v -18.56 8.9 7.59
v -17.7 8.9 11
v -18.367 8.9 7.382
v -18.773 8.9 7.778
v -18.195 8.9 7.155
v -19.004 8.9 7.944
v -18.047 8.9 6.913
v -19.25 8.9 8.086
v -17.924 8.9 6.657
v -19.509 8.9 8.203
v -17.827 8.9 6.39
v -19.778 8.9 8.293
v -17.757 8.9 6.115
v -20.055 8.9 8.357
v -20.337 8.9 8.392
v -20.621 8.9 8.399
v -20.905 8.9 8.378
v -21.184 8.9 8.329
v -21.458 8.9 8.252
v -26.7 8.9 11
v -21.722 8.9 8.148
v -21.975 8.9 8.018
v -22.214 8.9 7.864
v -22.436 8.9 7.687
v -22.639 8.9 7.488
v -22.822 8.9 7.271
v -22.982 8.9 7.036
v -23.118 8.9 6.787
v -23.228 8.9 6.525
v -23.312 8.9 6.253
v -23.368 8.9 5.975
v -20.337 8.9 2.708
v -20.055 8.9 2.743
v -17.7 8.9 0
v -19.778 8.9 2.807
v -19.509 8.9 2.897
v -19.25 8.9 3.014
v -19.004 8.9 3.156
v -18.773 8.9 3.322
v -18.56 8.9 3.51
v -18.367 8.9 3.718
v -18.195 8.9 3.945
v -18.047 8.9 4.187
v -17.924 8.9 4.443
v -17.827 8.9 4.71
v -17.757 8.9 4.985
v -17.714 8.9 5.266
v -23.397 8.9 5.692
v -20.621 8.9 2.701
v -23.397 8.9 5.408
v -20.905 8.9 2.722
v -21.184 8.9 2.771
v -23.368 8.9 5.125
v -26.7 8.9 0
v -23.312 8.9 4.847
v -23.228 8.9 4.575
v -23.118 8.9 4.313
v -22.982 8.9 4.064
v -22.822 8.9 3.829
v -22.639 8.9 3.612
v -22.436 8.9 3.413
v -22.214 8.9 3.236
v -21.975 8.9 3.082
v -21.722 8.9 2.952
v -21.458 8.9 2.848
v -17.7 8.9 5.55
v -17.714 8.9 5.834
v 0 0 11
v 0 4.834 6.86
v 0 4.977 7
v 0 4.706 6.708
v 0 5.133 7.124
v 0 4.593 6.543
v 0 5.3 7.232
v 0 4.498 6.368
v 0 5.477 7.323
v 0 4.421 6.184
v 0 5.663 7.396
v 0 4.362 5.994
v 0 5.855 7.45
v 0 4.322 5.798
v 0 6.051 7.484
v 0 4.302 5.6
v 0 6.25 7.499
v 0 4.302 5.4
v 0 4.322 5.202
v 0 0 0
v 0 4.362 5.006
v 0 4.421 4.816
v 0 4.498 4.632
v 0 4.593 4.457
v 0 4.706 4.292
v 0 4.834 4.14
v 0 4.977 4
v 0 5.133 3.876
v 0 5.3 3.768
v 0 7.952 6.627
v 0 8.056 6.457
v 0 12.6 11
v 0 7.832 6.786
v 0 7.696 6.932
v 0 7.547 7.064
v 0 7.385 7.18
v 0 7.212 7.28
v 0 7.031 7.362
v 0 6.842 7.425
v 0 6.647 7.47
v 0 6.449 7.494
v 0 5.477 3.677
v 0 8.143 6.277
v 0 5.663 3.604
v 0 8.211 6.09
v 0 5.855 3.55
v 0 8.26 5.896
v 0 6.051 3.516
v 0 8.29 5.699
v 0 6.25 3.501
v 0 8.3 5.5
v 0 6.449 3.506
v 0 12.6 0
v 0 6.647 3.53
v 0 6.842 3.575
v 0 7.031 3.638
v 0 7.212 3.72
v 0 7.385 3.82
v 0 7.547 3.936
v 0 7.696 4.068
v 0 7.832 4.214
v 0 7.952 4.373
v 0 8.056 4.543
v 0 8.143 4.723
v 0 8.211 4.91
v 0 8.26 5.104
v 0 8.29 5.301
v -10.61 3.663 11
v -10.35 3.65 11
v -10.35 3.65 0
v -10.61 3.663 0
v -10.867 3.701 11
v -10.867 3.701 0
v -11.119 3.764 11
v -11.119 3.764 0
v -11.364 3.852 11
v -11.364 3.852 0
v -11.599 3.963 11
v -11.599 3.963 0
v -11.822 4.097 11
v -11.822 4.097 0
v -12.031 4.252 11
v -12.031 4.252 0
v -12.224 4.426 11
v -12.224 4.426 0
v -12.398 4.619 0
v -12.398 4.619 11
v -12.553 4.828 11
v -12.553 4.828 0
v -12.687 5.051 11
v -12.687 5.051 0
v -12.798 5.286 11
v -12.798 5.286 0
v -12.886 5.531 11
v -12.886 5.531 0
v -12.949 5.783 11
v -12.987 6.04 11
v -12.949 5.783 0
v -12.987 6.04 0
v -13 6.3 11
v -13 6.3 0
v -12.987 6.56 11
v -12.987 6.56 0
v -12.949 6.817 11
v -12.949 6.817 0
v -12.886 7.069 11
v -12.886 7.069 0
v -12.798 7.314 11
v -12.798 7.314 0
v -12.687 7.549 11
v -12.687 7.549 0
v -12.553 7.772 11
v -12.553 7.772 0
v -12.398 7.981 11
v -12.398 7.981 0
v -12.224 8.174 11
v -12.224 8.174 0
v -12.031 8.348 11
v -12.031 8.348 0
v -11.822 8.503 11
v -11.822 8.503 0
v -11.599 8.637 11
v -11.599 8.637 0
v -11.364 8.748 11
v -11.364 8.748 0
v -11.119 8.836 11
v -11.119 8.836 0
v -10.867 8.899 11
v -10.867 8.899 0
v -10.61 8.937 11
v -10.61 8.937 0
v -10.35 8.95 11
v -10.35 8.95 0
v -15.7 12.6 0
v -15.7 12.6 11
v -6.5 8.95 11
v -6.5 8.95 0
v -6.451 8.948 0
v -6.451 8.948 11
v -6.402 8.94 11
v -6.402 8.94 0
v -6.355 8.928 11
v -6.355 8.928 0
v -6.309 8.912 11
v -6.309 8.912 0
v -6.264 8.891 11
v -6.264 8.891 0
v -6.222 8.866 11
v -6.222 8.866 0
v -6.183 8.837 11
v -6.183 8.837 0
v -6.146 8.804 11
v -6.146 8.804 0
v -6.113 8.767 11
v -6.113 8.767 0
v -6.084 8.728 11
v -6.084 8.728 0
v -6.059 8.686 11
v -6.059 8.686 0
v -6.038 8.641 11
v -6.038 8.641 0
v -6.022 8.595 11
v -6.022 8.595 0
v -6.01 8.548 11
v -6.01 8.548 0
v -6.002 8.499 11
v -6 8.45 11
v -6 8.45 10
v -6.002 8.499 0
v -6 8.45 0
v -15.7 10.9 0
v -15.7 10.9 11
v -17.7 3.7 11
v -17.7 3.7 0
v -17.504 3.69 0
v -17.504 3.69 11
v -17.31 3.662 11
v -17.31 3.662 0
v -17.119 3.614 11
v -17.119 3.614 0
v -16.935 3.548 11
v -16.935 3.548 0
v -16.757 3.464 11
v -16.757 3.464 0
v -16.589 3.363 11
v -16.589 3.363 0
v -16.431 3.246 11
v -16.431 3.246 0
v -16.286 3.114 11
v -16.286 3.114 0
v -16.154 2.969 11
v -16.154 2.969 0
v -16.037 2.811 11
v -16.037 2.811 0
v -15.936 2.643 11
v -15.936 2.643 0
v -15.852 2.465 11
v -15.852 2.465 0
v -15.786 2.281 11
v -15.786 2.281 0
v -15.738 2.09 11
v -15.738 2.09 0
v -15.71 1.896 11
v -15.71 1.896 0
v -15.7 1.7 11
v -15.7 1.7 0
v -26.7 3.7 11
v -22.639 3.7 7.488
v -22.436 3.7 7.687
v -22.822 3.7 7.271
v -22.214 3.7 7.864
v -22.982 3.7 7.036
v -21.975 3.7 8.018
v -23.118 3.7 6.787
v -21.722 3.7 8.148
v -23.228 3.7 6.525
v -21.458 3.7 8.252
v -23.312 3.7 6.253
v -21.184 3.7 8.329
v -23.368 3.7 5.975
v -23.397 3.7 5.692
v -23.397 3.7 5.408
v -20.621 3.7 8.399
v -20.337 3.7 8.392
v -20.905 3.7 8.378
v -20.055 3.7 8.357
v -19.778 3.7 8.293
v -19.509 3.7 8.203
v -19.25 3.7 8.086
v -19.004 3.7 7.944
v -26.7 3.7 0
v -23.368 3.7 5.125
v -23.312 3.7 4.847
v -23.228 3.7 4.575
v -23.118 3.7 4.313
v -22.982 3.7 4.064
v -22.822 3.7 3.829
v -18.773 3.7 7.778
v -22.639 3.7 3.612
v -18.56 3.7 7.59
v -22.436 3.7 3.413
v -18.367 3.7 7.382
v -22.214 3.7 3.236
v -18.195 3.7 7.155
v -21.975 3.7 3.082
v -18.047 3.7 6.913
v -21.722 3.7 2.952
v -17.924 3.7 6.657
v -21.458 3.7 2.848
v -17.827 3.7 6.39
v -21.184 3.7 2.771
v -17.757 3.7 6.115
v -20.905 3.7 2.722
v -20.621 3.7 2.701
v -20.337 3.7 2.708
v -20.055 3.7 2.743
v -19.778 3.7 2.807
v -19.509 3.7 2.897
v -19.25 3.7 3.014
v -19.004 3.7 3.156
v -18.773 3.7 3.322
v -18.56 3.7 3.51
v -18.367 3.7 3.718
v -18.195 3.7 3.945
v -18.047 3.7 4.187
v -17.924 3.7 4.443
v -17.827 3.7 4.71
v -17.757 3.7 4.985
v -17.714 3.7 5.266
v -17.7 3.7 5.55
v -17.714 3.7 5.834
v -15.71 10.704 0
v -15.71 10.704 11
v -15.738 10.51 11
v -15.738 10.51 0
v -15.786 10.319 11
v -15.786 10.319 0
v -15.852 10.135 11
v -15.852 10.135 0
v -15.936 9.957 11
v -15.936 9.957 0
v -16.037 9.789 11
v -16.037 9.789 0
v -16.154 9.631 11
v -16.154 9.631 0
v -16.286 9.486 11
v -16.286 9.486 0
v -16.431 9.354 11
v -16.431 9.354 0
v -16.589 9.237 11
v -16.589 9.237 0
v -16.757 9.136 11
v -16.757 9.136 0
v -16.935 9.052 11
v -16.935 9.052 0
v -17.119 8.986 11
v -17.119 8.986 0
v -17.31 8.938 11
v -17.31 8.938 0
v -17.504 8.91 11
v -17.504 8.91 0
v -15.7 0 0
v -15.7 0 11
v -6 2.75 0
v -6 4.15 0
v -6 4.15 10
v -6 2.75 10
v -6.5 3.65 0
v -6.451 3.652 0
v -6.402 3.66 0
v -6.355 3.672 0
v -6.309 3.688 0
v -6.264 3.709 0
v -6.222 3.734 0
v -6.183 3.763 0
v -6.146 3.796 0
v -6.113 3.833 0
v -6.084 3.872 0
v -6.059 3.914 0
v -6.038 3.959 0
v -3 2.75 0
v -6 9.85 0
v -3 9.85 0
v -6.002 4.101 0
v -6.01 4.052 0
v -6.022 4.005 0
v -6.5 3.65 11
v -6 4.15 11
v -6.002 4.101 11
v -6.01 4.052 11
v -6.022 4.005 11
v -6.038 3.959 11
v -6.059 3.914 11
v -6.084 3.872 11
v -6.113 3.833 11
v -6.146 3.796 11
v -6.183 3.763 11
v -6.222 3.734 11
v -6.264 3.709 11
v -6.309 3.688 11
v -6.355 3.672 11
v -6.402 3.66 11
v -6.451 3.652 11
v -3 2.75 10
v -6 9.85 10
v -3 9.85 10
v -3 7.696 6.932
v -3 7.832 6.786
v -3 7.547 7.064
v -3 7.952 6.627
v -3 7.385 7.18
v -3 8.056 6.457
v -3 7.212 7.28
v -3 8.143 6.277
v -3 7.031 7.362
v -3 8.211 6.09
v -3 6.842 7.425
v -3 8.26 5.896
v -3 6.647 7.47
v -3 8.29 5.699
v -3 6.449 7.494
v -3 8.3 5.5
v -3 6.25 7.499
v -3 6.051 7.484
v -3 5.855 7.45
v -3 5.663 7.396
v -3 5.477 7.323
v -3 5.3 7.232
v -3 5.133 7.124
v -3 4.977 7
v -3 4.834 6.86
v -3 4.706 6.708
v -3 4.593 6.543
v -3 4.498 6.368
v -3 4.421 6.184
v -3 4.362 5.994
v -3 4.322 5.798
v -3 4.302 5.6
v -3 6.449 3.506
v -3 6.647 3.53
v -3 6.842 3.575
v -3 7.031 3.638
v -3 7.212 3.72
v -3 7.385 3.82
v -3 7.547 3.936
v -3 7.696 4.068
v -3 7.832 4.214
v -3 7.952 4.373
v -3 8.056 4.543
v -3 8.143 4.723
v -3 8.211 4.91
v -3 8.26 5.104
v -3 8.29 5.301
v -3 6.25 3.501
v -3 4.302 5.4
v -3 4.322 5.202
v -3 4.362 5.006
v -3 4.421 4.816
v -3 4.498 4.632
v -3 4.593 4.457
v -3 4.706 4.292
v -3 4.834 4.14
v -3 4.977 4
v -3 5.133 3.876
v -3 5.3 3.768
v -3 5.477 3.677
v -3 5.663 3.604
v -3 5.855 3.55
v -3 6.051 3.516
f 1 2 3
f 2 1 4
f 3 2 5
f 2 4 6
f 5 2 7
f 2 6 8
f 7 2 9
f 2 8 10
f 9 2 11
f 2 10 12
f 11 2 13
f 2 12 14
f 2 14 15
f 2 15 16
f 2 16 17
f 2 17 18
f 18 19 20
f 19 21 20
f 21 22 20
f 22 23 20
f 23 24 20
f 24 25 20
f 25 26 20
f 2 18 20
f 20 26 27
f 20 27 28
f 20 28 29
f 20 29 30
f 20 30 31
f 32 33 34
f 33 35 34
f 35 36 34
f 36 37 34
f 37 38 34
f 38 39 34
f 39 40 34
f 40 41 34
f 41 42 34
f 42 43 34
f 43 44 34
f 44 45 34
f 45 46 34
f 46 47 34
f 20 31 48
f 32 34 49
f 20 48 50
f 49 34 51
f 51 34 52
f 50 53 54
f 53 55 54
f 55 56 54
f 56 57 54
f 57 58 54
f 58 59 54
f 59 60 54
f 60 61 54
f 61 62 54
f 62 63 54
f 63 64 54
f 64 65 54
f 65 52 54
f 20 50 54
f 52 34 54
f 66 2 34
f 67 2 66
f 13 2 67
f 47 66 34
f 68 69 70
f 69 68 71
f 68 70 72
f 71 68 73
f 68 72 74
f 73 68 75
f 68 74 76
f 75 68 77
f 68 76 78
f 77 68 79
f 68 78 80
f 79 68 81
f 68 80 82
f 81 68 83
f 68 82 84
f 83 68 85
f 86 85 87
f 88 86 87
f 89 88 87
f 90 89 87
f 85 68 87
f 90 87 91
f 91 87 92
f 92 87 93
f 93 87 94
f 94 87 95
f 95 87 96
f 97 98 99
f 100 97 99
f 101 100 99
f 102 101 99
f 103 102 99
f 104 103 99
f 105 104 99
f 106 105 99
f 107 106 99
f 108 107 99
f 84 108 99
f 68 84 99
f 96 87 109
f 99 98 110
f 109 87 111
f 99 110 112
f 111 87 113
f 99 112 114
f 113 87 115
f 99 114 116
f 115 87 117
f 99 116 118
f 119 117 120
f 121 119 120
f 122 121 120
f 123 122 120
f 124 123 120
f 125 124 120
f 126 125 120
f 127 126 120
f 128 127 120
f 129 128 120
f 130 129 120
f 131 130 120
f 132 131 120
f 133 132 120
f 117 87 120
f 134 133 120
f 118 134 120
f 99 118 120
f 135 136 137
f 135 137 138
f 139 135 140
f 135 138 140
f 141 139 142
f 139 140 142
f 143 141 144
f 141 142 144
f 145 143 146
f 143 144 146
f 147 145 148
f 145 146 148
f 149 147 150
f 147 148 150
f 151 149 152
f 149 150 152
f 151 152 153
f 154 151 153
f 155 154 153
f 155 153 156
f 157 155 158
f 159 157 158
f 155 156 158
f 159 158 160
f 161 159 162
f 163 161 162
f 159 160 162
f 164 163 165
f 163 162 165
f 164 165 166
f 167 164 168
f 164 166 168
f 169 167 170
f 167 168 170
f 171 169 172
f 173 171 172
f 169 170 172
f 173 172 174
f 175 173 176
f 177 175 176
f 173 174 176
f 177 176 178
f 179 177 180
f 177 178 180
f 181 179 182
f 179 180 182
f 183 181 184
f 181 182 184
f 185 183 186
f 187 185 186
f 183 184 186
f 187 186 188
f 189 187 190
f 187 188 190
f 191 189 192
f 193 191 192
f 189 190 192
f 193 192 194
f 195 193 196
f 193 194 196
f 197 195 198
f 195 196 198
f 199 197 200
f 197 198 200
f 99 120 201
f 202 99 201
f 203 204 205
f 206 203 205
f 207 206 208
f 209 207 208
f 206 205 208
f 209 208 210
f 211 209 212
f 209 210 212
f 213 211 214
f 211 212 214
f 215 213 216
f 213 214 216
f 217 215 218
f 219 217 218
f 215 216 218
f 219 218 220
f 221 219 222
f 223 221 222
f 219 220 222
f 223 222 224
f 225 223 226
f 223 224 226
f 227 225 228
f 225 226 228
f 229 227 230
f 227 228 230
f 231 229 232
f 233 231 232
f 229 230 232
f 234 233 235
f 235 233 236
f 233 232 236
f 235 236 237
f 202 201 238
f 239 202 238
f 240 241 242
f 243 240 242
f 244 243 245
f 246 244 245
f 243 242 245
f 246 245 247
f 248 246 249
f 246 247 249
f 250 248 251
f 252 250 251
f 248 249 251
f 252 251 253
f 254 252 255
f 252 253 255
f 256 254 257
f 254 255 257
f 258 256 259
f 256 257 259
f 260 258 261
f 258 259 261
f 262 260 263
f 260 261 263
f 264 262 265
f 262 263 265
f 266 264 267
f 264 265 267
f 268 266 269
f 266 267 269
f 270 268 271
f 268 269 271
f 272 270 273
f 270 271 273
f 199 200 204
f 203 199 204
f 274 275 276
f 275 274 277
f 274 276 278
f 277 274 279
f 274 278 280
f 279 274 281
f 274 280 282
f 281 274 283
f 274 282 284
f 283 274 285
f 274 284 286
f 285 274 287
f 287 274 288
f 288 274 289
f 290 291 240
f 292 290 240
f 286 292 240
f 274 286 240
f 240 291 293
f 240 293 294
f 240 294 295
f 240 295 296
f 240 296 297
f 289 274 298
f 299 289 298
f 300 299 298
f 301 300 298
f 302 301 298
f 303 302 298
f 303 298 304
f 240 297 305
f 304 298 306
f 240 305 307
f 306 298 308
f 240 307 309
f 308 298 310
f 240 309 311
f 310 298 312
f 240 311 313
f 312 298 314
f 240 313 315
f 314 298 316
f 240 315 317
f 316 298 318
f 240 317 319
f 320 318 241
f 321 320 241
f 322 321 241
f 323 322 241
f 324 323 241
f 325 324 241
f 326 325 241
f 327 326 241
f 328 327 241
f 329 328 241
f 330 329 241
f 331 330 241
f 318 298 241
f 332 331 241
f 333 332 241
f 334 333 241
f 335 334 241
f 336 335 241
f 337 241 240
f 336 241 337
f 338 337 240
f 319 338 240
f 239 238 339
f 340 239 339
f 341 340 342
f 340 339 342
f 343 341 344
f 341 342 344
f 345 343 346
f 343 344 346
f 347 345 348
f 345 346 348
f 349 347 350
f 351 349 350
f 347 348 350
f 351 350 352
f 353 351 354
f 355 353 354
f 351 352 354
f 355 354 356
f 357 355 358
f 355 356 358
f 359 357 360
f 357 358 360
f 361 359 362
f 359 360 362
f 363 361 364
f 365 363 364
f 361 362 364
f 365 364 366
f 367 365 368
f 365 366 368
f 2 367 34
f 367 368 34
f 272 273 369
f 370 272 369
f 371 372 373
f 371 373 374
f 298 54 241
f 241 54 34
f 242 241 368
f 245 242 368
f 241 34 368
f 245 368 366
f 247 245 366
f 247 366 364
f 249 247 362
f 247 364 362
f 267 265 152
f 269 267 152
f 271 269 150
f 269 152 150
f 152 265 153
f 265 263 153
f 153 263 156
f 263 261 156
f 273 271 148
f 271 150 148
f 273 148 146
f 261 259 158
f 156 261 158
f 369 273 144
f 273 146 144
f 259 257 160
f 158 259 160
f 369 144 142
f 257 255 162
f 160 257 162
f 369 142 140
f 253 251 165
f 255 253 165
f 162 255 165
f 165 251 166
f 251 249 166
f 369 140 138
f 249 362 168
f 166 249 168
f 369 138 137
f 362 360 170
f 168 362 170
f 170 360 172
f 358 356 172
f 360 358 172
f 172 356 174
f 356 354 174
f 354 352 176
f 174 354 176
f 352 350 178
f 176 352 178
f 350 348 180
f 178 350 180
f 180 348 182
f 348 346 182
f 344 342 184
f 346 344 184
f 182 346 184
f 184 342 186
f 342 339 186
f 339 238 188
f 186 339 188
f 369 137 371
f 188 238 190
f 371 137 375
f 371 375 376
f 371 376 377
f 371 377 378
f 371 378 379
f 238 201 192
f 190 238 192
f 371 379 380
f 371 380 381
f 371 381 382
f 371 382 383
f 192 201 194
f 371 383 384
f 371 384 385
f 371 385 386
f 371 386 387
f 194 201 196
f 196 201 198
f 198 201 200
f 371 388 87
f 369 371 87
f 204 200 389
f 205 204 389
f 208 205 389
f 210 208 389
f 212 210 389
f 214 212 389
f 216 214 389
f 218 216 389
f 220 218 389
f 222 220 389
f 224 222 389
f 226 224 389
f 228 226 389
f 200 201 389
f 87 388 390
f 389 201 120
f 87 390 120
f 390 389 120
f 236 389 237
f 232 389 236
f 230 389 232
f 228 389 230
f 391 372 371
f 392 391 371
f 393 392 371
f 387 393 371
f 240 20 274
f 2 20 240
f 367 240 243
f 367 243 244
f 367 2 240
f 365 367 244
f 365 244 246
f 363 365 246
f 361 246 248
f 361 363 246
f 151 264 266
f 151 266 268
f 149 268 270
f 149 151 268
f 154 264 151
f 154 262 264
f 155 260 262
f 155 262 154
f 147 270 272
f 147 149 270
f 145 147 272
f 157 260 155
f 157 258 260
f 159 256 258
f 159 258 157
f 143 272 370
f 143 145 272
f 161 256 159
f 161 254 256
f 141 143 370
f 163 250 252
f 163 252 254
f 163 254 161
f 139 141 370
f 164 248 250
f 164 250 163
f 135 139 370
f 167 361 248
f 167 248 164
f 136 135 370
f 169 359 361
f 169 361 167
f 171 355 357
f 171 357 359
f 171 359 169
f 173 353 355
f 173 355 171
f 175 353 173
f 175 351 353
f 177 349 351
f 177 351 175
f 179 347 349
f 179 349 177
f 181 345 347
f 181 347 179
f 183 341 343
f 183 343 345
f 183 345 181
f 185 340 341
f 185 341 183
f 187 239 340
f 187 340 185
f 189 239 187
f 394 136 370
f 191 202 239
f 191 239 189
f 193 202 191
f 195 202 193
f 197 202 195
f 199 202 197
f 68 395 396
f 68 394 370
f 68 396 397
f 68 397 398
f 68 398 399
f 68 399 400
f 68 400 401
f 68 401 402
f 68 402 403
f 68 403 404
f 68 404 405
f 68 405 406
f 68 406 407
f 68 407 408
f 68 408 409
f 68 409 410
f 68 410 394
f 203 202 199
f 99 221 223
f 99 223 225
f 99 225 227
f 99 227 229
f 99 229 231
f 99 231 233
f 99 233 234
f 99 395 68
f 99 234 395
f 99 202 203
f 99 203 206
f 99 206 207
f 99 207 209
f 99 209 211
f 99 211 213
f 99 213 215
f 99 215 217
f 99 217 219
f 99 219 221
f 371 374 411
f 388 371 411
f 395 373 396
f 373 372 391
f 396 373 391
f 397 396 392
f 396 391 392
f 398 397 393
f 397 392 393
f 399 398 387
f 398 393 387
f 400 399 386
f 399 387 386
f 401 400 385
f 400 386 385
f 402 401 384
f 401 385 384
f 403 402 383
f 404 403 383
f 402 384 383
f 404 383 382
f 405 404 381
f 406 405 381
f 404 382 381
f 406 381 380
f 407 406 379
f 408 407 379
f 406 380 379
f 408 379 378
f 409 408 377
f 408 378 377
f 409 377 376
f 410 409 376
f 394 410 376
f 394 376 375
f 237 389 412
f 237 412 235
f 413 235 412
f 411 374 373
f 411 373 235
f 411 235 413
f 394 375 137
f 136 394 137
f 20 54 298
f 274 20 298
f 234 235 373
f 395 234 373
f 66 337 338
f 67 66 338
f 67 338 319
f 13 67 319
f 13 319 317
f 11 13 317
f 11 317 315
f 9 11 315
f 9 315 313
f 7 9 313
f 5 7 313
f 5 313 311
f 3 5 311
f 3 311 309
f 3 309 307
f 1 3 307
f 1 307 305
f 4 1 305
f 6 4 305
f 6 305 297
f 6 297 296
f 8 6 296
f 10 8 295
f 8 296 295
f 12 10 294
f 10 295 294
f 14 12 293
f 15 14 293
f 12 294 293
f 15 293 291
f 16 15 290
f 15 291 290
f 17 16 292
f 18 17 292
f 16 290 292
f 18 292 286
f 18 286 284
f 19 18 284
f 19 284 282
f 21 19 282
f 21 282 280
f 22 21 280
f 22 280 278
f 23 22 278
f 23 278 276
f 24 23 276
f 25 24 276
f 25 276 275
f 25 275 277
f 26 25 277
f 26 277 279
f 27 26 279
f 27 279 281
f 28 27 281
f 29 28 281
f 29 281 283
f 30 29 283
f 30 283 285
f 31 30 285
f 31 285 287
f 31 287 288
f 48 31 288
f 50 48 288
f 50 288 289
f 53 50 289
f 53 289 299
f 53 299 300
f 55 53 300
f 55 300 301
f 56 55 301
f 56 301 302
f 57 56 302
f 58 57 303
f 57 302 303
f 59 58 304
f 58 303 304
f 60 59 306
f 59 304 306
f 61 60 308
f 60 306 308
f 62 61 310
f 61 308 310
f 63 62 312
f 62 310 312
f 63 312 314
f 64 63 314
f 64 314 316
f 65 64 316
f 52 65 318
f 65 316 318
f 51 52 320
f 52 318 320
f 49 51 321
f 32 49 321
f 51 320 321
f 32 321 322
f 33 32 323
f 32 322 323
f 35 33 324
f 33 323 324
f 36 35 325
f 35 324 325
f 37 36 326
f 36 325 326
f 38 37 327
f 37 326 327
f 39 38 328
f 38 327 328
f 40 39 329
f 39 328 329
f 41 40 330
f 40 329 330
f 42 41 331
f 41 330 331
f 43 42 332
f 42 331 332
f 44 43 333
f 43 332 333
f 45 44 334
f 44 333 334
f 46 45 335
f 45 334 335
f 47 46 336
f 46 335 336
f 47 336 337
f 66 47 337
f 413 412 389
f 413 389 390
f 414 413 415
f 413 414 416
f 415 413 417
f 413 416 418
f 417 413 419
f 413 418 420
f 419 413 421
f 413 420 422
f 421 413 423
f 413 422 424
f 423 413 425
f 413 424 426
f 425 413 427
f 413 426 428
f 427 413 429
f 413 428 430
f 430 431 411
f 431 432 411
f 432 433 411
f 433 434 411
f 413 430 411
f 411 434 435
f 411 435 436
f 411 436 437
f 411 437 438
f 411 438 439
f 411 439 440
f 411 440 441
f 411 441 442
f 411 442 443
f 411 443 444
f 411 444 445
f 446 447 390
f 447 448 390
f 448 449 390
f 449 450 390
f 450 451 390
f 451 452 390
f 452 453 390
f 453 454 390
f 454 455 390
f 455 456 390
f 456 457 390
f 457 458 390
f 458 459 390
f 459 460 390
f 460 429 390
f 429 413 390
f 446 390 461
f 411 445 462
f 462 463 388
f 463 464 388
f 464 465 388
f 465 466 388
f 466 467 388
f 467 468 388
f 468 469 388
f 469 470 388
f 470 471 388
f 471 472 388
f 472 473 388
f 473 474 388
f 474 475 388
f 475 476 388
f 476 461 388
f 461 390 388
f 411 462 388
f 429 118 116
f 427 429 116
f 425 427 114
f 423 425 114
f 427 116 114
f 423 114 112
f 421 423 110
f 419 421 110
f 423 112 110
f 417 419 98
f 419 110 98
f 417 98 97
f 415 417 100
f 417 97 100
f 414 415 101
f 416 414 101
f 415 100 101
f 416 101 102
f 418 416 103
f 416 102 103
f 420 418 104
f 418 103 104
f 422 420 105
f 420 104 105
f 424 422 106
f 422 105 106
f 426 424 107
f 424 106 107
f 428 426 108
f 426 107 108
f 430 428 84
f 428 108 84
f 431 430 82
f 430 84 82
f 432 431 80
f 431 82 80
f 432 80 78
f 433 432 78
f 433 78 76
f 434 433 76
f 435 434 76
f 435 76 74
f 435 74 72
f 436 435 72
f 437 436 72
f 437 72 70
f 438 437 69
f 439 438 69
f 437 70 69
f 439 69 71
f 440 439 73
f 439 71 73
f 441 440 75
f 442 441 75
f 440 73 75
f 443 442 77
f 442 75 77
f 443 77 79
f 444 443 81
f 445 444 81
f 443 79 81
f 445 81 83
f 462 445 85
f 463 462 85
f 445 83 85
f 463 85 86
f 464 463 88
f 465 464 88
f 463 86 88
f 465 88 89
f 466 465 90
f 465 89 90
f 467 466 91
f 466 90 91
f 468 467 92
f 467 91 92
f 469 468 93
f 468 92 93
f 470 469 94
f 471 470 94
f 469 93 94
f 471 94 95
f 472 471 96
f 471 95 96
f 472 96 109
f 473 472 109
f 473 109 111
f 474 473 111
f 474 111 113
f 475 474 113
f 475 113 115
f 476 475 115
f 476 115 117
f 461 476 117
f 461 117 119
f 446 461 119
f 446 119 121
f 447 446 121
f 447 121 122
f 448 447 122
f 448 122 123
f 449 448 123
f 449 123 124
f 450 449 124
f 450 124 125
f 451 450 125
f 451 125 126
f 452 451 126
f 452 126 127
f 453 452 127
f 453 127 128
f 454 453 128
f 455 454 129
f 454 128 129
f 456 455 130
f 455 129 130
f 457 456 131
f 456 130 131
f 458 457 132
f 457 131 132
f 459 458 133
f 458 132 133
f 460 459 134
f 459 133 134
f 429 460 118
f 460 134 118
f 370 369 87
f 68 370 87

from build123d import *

# Parameters (mm, degrees)
F1_DEPTH = 11
F2_R     = 2.85
F3_DEPTH = 25
F4_W     = 3
F4_H     = 7.1
F5_DEPTH = 10
F6_R     = 2
F7_DEPTH = 3


with BuildPart() as f1:
    # F0 (on Top) → F1 (new body)
    with BuildSketch(Plane.XY):
        with BuildLine():
            Line((-15.7, 1.7), (-15.7, 0))
            Line((-15.7, 0), (0, 0))
            Line((0, 0), (0, 12.6))
            Line((0, 12.6), (-15.7, 12.6))
            Line((-15.7, 12.6), (-15.7, 10.9))
            ThreePointArc((-15.7, 10.9), (-16.285786, 9.485786), (-17.7, 8.9))
            Line((-17.7, 8.9), (-26.7, 8.9))
            Line((-26.7, 8.9), (-26.7, 3.7))
            Line((-26.7, 3.7), (-17.7, 3.7))
            ThreePointArc((-17.7, 3.7), (-16.285786, 3.114214), (-15.7, 1.7))
        make_face()
        with BuildLine():
            ThreePointArc((-6, 4.15), (-6.146447, 3.796447), (-6.5, 3.65))
            Line((-6.5, 3.65), (-10.35, 3.65))
            ThreePointArc((-10.35, 3.65), (-13, 6.3), (-10.35, 8.95))
            Line((-10.35, 8.95), (-6.5, 8.95))
            ThreePointArc((-6.5, 8.95), (-6.146447, 8.803553), (-6, 8.45))
            Line((-6, 8.45), (-6, 4.15))
        make_face(mode=Mode.SUBTRACT)
    extrude(amount=F1_DEPTH)

    # F2 (on face) → F3 (cut)
    with BuildSketch(Plane.XZ.offset(-3.7)):
        with Locations((-20.550203, 5.55)):
            Circle(F2_R)
    extrude(amount=-F3_DEPTH, mode=Mode.SUBTRACT)

    # F4 (on face) → F5 (cut)
    with BuildSketch(Plane(origin=(0, 0, 0), x_dir=(1, 0, 0), z_dir=(0, 0, -1))):
        with Locations((-4.5, -6.3)):
            Rectangle(F4_W, F4_H)
    extrude(amount=-F5_DEPTH, mode=Mode.SUBTRACT)

    # F6 (on face) → F7 (cut, through all)
    with BuildSketch(Plane.YZ):
        with Locations((6.3, 5.5)):
            Circle(F6_R)
    extrude(amount=-F7_DEPTH, mode=Mode.SUBTRACT)


solid = f1.part
